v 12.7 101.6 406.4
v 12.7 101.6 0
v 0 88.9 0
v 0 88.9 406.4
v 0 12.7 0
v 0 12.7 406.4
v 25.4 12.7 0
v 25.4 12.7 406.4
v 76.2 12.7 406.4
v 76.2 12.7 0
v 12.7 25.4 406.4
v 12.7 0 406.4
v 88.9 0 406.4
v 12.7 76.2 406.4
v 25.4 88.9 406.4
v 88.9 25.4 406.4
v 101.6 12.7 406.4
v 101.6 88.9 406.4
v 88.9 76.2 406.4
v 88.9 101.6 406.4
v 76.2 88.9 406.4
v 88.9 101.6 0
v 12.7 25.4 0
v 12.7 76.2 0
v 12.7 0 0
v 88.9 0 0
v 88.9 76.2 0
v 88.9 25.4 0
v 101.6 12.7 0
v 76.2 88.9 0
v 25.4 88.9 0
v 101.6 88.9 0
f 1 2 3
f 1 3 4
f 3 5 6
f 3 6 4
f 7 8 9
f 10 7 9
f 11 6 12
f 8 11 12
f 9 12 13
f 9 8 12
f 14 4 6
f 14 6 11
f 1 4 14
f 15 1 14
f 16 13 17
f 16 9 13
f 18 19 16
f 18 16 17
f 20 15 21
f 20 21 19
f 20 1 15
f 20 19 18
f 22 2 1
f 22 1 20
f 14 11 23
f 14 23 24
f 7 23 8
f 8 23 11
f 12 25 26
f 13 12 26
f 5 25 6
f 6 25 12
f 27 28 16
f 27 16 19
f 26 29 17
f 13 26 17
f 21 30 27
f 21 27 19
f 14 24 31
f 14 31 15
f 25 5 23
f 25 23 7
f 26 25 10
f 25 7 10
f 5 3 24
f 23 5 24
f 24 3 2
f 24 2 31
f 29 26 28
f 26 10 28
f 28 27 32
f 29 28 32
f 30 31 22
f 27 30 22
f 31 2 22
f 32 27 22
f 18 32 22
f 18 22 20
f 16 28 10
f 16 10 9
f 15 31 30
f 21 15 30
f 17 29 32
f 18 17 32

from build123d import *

# Parameters (mm, degrees)
F0_W     = 101.6
F0_H     = 101.6
F0_W_2   = 76.2
F0_H_2   = 76.2
F1_DEPTH = 406.4
F2_SIZE  = 12.7
F3_SIZE  = 12.7


with BuildPart() as f1:
    # F0 (on Top) → F1 (new body)
    with BuildSketch(Plane.XY):
        with Locations((50.8, 50.8)):
            Rectangle(F0_W, F0_H)
        with Locations((50.8, 50.8)):
            Rectangle(F0_W_2, F0_H_2, mode=Mode.SUBTRACT)
    extrude(amount=F1_DEPTH)

    # F2
    f2_edges = [f1.edges().sort_by_distance(p)[0] for p in [
        (12.7, 88.9, 203.2),
        (88.9, 88.9, 203.2),
        (88.9, 12.7, 203.2),
        (12.7, 12.7, 203.2),
    ]]
    chamfer(f2_edges, length=F2_SIZE)

    # F3
    f3_edges = [f1.edges().sort_by_distance(p)[0] for p in [
        (101.6, 0, 203.2),
        (101.6, 101.6, 203.2),
        (0, 0, 203.2),
        (0, 101.6, 203.2),
    ]]
    chamfer(f3_edges, length=F3_SIZE)


solid = f1.part
